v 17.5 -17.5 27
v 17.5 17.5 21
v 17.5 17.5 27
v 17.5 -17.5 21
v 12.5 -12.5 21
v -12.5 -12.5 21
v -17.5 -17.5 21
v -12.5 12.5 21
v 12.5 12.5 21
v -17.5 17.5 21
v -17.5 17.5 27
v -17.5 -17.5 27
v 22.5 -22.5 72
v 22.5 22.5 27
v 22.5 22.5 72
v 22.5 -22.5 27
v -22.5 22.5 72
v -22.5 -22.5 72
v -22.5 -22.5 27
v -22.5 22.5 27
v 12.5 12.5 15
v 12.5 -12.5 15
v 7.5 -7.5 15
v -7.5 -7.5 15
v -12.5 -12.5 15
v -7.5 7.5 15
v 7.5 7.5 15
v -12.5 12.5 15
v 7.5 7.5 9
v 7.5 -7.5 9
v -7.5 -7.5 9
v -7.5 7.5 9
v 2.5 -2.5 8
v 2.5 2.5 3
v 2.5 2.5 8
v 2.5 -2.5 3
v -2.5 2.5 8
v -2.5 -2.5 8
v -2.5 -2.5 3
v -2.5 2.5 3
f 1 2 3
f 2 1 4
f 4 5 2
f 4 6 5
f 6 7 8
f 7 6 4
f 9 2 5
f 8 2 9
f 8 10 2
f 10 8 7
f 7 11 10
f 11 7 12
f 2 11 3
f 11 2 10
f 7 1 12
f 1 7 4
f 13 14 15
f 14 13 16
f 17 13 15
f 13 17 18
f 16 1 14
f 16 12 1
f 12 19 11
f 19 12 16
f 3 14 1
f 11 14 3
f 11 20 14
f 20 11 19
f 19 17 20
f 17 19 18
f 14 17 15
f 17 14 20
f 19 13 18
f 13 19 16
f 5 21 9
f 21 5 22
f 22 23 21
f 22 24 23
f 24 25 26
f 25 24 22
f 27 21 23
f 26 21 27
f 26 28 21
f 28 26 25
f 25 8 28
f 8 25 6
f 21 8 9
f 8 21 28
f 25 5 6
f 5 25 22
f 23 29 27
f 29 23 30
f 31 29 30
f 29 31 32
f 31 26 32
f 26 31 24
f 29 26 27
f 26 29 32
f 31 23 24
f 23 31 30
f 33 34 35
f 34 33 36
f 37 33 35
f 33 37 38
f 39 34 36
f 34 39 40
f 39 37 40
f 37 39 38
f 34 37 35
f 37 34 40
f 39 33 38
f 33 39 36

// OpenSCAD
module steps(z) {
    if (z<=50) {
        translate([0,0,1.1*z]) cube([z,z,z], center=true);
        steps(z+10);
    }
}

steps(5);
